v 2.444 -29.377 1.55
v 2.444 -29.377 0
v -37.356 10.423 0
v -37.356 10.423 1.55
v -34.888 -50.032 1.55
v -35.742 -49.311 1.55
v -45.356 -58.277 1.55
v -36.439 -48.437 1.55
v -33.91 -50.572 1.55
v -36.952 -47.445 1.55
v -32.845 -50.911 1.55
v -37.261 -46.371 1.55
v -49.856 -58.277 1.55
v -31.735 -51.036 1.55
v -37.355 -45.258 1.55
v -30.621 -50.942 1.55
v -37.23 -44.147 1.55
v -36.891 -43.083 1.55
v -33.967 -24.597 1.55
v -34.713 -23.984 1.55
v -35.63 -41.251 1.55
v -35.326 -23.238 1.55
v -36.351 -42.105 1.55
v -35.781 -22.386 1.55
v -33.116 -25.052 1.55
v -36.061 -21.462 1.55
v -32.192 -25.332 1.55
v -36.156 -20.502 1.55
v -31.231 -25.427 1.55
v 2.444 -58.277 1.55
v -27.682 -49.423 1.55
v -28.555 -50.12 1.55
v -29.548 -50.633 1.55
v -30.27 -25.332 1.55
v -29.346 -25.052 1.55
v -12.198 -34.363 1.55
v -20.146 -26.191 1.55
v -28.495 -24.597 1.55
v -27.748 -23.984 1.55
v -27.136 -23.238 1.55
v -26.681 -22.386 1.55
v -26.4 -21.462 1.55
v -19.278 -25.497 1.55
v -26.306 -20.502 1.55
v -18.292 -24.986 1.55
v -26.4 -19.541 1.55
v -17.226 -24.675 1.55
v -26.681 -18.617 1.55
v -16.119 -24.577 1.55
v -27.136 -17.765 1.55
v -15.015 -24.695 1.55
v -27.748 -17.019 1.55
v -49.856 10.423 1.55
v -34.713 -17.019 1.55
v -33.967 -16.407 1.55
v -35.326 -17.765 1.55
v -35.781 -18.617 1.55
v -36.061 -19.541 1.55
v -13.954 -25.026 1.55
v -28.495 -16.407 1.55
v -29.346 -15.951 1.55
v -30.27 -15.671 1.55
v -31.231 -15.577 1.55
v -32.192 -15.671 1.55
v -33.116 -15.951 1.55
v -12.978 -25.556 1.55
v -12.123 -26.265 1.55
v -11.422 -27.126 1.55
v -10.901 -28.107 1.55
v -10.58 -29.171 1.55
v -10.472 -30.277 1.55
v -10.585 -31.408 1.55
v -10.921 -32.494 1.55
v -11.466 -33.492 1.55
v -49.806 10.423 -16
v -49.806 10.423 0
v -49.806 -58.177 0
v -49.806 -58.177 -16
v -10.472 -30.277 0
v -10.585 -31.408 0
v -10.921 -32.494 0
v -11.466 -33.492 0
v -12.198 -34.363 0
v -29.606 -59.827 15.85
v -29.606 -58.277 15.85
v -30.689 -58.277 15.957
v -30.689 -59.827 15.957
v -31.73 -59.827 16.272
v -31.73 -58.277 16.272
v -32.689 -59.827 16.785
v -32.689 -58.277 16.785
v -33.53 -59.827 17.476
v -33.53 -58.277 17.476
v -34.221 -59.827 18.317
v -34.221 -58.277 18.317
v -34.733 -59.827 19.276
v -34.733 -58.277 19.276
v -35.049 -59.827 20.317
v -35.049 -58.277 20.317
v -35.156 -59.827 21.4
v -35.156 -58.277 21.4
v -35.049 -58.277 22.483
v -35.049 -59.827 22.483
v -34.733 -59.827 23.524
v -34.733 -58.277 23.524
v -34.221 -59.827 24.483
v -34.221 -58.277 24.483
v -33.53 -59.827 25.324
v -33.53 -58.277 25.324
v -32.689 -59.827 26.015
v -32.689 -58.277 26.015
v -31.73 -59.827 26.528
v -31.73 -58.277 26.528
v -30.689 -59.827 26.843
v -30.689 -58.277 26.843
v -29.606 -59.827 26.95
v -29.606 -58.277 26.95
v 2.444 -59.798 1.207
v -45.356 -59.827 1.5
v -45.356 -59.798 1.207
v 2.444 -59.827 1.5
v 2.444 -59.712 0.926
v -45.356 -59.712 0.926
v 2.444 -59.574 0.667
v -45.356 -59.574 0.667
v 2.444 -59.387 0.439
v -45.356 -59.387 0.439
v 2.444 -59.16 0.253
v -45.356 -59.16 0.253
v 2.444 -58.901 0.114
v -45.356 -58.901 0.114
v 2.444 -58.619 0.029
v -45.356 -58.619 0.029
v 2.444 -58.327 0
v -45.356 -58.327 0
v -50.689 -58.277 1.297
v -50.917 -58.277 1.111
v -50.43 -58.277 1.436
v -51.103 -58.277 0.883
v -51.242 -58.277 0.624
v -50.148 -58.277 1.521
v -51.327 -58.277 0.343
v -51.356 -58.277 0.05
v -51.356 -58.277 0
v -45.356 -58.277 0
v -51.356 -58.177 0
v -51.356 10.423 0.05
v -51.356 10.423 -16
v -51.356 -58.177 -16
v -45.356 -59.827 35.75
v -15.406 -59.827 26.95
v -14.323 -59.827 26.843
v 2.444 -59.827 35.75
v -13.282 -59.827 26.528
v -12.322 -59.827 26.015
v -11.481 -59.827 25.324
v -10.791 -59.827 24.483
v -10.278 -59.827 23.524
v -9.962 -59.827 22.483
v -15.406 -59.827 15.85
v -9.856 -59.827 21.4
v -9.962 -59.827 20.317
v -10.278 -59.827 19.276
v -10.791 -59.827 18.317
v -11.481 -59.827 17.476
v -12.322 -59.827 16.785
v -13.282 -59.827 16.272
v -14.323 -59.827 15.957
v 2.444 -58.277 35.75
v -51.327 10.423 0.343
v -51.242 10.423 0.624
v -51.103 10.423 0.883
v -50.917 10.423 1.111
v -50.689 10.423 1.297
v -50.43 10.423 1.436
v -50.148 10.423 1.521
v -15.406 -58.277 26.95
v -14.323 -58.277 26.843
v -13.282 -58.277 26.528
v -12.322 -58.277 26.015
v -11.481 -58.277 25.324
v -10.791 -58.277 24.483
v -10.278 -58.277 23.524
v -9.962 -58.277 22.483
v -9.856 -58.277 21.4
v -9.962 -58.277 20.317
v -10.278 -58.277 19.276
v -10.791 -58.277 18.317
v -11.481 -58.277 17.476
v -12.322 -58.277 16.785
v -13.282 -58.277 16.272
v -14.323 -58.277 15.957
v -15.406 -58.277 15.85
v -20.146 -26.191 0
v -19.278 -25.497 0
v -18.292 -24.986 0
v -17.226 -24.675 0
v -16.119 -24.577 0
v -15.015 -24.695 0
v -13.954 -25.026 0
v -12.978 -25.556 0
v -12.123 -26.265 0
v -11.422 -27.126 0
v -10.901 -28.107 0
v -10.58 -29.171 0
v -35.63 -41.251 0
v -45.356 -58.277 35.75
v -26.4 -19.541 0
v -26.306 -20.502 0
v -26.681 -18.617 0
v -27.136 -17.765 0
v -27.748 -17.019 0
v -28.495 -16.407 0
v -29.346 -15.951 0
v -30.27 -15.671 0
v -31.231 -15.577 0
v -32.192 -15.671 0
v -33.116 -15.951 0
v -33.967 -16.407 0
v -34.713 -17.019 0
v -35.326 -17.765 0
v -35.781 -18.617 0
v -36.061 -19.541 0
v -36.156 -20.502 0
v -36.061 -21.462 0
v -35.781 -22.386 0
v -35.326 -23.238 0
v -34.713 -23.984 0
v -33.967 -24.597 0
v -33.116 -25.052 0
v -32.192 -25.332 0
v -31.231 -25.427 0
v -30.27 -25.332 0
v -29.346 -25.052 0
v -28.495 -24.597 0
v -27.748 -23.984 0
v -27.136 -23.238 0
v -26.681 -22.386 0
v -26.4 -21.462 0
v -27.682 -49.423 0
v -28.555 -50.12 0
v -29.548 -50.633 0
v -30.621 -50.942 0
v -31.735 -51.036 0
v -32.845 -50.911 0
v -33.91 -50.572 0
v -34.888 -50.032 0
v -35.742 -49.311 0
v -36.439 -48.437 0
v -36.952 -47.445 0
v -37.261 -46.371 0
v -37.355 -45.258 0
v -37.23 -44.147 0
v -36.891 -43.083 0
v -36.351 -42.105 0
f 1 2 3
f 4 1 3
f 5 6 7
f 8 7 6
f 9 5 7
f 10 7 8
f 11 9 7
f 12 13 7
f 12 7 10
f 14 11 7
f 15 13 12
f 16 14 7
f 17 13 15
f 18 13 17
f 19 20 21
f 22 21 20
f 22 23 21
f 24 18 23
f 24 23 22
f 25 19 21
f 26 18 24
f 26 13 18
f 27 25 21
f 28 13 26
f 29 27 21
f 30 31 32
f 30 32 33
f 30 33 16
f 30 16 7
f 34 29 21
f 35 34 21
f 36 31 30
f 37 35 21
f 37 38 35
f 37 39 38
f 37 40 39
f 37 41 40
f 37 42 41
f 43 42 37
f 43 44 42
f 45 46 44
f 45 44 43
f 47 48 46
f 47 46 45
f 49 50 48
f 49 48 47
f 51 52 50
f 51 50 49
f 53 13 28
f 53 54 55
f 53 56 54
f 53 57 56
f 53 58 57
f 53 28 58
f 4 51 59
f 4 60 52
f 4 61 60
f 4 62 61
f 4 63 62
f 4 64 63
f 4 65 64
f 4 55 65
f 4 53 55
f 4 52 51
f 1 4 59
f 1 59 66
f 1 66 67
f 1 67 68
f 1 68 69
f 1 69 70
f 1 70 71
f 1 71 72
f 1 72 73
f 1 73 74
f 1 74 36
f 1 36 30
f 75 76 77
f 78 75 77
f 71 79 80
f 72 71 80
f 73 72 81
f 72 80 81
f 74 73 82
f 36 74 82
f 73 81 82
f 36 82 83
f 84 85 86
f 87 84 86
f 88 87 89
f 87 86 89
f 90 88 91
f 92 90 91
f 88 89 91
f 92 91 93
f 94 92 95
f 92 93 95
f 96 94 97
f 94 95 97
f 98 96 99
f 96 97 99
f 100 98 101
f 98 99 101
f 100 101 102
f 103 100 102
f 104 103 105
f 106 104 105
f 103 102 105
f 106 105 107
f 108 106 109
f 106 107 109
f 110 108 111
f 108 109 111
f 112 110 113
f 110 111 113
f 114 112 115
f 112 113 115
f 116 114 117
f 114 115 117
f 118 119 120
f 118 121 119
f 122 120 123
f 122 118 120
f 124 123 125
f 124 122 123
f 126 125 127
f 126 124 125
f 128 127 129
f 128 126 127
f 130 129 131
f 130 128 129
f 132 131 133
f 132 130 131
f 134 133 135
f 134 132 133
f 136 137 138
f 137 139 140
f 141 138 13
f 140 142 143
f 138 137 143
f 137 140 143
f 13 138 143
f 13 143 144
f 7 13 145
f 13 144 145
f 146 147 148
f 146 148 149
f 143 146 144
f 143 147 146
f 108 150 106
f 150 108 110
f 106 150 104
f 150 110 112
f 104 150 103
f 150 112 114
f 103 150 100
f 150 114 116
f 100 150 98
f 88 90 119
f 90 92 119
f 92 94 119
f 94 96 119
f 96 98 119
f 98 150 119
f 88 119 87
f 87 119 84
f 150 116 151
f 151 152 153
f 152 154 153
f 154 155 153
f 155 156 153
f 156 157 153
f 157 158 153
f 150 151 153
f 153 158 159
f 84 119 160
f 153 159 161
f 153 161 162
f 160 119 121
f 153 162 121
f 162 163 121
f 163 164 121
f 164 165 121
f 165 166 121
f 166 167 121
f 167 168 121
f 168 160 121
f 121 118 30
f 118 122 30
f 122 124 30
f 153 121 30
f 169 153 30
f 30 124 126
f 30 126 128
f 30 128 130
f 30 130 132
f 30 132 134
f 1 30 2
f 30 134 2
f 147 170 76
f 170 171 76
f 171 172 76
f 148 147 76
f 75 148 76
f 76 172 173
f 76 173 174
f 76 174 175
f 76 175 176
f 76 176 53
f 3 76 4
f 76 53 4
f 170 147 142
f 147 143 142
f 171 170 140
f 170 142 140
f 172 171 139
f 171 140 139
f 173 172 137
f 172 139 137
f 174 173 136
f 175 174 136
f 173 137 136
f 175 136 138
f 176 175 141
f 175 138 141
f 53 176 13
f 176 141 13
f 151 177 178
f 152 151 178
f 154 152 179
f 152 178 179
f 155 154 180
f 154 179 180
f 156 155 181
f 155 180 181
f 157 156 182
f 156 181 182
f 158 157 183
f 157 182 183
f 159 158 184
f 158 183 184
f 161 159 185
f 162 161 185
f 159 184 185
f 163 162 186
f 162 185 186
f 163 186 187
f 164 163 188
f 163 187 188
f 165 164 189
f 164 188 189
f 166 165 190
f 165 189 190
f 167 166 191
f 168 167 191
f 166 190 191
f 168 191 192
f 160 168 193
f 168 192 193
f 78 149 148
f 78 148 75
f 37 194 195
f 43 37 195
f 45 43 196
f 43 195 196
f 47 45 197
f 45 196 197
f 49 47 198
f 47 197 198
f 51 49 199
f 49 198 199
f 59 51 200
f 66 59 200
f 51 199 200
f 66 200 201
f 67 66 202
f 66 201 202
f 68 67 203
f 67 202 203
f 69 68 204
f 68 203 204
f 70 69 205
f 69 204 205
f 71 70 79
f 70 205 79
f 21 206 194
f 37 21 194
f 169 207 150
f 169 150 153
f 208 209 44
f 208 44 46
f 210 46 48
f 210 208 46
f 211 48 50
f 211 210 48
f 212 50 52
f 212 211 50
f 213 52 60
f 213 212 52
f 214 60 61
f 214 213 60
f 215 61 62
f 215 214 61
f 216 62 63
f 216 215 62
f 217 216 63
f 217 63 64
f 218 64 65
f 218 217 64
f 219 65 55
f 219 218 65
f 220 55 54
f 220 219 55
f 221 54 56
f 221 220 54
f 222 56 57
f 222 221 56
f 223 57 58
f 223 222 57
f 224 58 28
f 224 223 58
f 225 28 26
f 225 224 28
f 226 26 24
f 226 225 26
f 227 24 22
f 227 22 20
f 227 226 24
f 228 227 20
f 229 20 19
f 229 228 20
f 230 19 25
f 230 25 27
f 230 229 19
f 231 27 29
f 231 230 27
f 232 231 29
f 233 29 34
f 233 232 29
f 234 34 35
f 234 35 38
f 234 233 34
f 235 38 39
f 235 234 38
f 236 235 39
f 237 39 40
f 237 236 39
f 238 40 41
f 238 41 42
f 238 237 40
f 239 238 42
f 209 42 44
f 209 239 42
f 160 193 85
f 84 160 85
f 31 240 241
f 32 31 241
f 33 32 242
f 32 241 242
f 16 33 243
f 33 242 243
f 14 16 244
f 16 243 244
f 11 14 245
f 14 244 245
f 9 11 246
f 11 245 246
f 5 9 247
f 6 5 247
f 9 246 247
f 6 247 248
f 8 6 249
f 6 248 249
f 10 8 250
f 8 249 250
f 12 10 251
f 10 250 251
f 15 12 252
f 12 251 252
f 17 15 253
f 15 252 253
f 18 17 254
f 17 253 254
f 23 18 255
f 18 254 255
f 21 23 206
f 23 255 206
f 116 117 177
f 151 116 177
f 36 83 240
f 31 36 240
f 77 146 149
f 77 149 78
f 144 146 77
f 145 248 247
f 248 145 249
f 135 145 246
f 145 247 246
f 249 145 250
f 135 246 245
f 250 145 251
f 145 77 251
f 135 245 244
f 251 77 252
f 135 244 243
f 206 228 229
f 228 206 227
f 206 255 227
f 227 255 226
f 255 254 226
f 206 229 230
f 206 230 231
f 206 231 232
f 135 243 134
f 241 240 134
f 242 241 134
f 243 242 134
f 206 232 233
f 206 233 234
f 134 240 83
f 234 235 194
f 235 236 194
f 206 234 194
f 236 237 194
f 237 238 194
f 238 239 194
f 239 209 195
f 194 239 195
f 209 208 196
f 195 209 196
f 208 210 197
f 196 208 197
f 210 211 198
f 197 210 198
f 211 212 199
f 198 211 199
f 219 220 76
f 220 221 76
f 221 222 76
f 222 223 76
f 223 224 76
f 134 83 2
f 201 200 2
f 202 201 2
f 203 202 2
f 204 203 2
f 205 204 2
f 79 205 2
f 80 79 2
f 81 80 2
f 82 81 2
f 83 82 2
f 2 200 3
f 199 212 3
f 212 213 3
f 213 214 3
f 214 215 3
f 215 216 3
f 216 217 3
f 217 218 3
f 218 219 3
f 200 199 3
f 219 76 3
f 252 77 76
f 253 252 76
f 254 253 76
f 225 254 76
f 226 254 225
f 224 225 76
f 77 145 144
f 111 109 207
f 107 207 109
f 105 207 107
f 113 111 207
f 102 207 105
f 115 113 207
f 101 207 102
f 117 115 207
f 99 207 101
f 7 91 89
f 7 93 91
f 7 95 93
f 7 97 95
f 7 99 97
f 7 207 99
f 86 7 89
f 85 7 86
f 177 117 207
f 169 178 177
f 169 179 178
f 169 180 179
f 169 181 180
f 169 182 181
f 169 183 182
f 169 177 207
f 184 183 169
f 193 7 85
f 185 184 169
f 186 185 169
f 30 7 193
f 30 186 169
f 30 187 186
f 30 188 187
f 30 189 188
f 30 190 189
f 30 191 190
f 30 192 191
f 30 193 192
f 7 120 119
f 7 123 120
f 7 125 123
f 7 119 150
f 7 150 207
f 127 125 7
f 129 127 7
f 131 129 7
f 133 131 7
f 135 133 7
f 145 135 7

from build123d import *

# Parameters (mm, degrees)
F0_R      = 4.925
F1_DEPTH  = 1.55
F2_W      = 1.55
F2_H      = 68.6
F3_DEPTH  = 16
F4_W      = 47.8
F4_H      = 1.55
F5_DEPTH  = 1.55
F6_W      = 47.8
F6_H      = 1.55
F7_DEPTH  = 34.2
F8_R      = 1.5
F10_DEPTH = 1.551


with BuildPart() as f1:
    # F0 (on Top) → F1 (new body)
    with BuildSketch(Plane.XY):
        Polygon((-51.3558513849, 10.4234758295), (-51.3558513849, -58.2765241705), (2.4441486151, -58.2765241705), (2.4441486151, -29.3765241705), (-37.3558513849, 10.4234758295), align=None)
        with BuildLine():
            ThreePointArc((-27.6816260073, -49.4227633754), (-35.7418681063, -49.3109720316), (-35.6300767624, -41.2507299325))
            Line((-35.6300767624, -41.2507299325), (-20.1462239232, -26.190507449))
            ThreePointArc((-20.1462239232, -26.190507449), (-13.9542389387, -25.0256630672), (-10.4719985456, -30.2765241705))
            ThreePointArc((-10.4719985456, -30.2765241705), (-10.9211374423, -32.4942837773), (-12.197773168, -34.3625408919))
            Line((-12.197773168, -34.3625408919), (-27.6816260073, -49.4227633754))
        make_face(mode=Mode.SUBTRACT)
        with Locations((-31.2308513849, -20.5015241705)):
            Circle(F0_R, mode=Mode.SUBTRACT)
    extrude(amount=F1_DEPTH)

    # F2 (on face) → F3 (join)
    with BuildSketch(Plane(origin=(0, 0, 0), x_dir=(1, 0, 0), z_dir=(0, 0, -1))):
        with Locations((-50.5808513849, 23.8765241705)):
            Rectangle(F2_W, F2_H)
    extrude(amount=F3_DEPTH)

    # F4 (on face) → F5 (join)
    with BuildSketch(Plane.XY.offset(1.55)):
        with Locations((-21.4558513849, -59.0515241705)):
            Rectangle(F4_W, F4_H)
    extrude(amount=-F5_DEPTH)

    # F6 (on face) → F7 (join)
    with BuildSketch(Plane.XY.offset(1.55)):
        with Locations((-21.4558513849, -59.0515241705)):
            Rectangle(F6_W, F6_H)
    extrude(amount=F7_DEPTH)

    # F8
    f8_edges = [f1.edges().sort_by_distance(p)[0] for p in [
        (-21.455851, -59.826524, 0),
        (-51.355851, -23.926524, 1.55),
    ]]
    fillet(f8_edges, radius=F8_R)

    # F9 (on face) → F10 (cut, through all)
    with BuildSketch(Plane(origin=(0, -58.2765241705, 0), x_dir=(-1, 0, 0), z_dir=(0, 1, 0))):
        with BuildLine():
            ThreePointArc((15.4058513849, 15.85), (19.3302940204, 17.4755573644), (20.9558513849, 21.4))
            ThreePointArc((20.9558513849, 21.4), (19.3302940204, 25.3244426356), (15.4058513849, 26.95))
            ThreePointArc((15.4058513849, 26.95), (9.8558513849, 21.4), (15.4058513849, 15.85))
        make_face()
        with BuildLine():
            ThreePointArc((15.4058513849, 26.95), (19.3302940204, 25.3244426356), (20.9558513849, 21.4))
            ThreePointArc((20.9558513849, 21.4), (19.3302940204, 17.4755573644), (15.4058513849, 15.85))
            Line((15.4058513849, 15.85), (29.6058513849, 15.85))
            ThreePointArc((29.6058513849, 15.85), (24.0558513849, 21.4), (29.6058513849, 26.95))
            Line((29.6058513849, 26.95), (15.4058513849, 26.95))
        make_face()
        with BuildLine():
            ThreePointArc((35.1558513849, 21.4), (33.5302940204, 25.3244426356), (29.6058513849, 26.95))
            ThreePointArc((29.6058513849, 26.95), (24.0558513849, 21.4), (29.6058513849, 15.85))
            ThreePointArc((29.6058513849, 15.85), (33.5302940204, 17.4755573644), (35.1558513849, 21.4))
        make_face()
    extrude(amount=-F10_DEPTH, mode=Mode.SUBTRACT)


solid = f1.part
